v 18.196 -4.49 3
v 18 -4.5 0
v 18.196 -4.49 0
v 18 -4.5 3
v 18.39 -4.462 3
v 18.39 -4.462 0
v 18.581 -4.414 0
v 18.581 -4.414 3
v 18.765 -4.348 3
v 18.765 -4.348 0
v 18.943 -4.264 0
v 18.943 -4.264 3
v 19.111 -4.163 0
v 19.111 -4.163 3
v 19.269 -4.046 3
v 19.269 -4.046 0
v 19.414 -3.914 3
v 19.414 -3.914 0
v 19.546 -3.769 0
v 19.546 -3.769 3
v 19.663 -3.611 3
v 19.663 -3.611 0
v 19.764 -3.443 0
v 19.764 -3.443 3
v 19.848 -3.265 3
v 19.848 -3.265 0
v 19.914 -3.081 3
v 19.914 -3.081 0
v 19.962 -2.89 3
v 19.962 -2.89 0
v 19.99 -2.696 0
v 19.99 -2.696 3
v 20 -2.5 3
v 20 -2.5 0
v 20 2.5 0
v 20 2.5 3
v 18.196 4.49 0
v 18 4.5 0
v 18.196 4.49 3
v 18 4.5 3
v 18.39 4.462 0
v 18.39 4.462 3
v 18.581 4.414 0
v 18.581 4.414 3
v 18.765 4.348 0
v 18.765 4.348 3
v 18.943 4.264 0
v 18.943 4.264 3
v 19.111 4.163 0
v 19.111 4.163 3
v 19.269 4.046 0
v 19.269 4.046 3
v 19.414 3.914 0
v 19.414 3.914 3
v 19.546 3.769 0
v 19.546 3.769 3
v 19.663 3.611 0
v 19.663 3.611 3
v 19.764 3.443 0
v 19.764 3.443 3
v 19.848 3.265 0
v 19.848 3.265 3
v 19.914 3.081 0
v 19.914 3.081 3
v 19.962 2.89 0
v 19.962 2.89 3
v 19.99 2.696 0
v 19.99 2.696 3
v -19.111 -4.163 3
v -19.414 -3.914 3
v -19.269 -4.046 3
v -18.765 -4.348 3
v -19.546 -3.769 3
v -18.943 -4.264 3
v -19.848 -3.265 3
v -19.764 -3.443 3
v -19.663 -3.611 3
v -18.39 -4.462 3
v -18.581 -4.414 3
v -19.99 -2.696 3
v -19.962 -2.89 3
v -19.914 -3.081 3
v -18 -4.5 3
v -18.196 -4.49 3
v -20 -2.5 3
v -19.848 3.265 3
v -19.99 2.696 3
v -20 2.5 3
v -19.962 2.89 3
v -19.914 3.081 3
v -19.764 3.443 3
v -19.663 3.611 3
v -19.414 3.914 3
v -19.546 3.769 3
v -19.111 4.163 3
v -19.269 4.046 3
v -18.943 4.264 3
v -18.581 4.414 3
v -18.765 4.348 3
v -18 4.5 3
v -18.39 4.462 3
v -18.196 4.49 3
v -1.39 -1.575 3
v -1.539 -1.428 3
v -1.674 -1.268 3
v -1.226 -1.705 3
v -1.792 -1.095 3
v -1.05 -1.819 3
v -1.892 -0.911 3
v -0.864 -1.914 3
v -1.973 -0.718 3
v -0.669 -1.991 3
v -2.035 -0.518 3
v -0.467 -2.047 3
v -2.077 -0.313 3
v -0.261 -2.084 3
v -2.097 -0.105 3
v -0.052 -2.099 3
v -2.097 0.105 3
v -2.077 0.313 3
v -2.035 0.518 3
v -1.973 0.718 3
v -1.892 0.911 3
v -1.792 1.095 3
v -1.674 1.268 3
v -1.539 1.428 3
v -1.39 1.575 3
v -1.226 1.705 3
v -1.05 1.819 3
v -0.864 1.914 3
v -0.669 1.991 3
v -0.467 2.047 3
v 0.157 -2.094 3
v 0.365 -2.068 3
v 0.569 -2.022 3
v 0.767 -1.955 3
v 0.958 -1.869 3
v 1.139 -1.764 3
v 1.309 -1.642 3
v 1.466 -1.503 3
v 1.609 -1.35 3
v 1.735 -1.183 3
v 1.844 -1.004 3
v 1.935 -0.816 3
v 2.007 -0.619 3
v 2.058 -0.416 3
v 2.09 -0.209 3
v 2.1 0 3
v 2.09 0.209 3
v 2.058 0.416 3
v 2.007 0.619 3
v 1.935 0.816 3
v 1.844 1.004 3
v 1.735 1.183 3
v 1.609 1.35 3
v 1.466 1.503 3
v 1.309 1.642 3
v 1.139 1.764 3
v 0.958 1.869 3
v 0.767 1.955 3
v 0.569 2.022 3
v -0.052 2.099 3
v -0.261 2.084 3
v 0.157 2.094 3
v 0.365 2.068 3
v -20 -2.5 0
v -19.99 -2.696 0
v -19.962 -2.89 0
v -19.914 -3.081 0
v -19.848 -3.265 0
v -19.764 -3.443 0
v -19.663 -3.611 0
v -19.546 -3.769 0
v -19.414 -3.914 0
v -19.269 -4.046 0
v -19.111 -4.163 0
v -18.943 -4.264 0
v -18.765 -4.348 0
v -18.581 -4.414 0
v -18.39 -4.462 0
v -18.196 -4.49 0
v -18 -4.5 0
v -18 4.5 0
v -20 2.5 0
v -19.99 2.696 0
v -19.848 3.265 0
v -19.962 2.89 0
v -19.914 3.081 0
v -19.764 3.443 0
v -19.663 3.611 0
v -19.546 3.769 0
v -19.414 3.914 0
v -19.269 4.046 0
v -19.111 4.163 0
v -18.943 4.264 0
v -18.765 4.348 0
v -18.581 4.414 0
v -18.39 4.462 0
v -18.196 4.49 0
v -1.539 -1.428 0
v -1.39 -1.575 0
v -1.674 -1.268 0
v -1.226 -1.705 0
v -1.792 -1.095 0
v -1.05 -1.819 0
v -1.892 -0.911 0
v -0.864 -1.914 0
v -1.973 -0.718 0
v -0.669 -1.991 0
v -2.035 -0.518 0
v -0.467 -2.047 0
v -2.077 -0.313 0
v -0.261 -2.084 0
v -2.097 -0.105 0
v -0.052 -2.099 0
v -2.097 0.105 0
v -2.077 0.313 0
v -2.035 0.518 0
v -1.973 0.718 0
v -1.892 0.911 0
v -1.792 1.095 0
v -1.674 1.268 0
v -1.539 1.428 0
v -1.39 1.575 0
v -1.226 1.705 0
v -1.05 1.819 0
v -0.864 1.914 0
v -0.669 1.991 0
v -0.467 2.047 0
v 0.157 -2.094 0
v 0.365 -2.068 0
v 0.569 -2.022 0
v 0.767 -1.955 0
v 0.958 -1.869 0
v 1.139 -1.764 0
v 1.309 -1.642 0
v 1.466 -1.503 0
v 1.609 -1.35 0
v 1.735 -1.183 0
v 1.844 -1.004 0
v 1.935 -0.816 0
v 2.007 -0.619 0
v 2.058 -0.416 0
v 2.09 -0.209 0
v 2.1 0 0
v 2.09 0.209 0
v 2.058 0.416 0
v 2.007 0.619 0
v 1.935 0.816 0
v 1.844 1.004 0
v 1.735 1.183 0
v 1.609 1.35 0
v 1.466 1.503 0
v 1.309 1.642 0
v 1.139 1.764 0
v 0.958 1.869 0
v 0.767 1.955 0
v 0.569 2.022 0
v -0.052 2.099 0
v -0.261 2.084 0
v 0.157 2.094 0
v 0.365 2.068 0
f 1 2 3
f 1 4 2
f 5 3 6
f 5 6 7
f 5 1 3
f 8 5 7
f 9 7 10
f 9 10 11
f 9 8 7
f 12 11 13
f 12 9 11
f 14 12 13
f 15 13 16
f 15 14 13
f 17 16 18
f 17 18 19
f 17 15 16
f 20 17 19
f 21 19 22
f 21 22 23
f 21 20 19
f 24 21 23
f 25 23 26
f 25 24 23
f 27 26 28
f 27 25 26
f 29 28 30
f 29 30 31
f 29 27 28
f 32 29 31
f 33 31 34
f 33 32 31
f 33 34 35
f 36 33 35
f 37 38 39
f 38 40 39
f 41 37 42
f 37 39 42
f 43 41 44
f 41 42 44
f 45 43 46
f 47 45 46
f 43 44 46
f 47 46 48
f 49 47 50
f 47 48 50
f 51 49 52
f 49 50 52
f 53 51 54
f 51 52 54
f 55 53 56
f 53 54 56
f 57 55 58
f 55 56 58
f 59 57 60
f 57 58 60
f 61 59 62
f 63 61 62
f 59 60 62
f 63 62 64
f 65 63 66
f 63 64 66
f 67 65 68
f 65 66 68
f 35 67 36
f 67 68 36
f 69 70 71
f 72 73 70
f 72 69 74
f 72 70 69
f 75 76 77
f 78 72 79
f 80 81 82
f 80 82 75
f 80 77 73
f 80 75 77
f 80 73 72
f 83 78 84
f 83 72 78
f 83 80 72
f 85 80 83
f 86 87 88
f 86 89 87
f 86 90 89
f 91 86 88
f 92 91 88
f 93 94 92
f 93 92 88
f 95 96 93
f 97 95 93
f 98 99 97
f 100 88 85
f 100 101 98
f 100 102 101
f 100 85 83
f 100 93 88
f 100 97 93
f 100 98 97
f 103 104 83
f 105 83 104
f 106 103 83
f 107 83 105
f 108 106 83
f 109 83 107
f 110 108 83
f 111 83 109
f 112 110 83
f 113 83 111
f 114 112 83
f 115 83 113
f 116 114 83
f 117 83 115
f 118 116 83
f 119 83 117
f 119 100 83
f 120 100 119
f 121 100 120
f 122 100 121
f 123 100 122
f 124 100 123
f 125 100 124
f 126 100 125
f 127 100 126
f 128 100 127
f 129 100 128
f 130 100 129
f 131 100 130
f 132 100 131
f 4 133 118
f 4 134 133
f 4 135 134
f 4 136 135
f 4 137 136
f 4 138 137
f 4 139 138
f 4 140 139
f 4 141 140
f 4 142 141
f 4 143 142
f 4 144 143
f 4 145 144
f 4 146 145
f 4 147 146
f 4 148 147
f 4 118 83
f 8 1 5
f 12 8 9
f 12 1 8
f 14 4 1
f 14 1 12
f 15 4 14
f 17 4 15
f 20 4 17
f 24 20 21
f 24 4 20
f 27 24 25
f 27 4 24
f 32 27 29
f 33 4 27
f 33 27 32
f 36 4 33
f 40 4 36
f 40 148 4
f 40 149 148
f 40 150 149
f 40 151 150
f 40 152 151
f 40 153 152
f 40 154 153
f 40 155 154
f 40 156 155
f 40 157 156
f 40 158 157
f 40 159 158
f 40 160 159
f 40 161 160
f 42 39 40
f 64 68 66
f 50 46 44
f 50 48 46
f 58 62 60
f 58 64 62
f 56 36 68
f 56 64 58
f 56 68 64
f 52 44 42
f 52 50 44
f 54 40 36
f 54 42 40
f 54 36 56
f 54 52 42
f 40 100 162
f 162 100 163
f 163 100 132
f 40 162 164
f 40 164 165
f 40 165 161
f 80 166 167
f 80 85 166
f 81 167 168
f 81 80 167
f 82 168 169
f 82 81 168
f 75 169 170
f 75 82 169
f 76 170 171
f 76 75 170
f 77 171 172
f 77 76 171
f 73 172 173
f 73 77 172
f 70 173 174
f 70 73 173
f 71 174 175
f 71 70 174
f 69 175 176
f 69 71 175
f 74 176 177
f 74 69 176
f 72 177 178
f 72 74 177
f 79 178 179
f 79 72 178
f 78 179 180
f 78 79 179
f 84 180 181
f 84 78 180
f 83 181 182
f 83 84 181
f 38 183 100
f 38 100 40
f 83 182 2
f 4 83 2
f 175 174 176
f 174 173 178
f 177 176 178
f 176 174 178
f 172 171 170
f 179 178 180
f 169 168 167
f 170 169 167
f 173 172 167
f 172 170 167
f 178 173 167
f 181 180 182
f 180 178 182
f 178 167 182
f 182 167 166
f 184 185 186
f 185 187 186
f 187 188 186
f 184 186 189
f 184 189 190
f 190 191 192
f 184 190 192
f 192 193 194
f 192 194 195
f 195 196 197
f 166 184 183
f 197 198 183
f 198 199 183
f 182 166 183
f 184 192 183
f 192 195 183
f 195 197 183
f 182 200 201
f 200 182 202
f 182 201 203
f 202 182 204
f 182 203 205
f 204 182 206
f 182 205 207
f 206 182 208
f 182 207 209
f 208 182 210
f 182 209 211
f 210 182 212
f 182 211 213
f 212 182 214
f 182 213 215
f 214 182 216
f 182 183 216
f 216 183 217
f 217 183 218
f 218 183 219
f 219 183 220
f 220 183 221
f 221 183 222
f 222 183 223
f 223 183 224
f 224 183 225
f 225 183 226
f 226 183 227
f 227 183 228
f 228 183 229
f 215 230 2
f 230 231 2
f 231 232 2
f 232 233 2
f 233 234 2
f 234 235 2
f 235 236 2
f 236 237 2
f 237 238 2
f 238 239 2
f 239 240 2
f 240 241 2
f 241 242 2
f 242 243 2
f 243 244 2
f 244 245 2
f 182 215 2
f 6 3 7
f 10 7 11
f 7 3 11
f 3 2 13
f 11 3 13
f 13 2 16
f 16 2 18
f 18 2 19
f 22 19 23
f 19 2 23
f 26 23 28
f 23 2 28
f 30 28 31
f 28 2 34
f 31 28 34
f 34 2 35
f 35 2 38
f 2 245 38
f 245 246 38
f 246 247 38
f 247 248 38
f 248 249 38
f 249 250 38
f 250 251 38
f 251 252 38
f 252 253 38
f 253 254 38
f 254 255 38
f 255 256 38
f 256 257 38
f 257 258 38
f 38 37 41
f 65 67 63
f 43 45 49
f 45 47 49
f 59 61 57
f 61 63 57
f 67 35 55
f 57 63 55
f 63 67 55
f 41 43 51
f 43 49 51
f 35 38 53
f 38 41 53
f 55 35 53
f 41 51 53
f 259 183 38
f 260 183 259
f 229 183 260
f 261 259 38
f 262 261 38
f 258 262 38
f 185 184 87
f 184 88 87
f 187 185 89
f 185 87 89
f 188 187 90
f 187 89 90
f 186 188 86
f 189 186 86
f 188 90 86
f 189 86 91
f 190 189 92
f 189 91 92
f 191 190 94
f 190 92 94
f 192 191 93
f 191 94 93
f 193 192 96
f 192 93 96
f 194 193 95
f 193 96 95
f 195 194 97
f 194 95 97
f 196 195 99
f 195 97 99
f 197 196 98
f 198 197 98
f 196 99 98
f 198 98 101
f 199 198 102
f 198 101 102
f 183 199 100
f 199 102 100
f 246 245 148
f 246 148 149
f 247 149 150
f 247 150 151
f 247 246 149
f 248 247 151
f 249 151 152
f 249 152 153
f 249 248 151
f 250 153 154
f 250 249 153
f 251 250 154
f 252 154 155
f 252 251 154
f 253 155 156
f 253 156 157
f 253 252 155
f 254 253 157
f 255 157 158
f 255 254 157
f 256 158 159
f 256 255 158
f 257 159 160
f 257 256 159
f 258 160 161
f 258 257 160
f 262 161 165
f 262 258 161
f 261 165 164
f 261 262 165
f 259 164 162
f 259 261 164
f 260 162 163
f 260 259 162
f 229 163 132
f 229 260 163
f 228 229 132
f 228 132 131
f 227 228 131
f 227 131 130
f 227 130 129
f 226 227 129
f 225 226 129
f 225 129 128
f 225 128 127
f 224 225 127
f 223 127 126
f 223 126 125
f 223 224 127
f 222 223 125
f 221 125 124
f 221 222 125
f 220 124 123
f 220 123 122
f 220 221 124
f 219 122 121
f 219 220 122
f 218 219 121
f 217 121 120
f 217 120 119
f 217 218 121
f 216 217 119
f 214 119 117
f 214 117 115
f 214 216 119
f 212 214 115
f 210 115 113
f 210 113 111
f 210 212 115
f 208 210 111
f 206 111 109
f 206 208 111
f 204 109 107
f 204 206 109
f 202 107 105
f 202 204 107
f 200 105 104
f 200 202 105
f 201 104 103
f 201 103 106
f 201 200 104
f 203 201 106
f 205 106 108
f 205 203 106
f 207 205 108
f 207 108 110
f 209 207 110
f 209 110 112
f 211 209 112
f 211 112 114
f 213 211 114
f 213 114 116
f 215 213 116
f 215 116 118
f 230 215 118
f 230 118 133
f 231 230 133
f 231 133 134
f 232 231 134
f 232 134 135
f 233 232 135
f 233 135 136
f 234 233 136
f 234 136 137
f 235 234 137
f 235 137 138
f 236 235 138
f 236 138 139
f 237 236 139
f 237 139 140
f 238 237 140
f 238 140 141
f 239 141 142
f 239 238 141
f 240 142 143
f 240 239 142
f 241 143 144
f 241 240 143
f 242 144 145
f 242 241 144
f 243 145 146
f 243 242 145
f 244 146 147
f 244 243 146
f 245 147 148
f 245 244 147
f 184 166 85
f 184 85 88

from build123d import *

# Parameters (mm, degrees)
SKETCH_1_W      = 40
SKETCH_1_H      = 9
SKETCH_1_R      = 2.1
EXTRUDE_1_DEPTH = 3
FILLET_1_R      = 2


with BuildPart() as part:
    # 草图1 → 凸台-拉伸1 (new body)
    with BuildSketch(Plane.XY):
        Rectangle(SKETCH_1_W, SKETCH_1_H)
        Circle(SKETCH_1_R, mode=Mode.SUBTRACT)
    extrude(amount=EXTRUDE_1_DEPTH)

    # 圆角1
    fillet_1_edges = [part.edges().sort_by_distance(p)[0] for p in [
        (-20, 4.5, 1.5),
        (20, 4.5, 1.5),
        (20, -4.5, 1.5),
        (-20, -4.5, 1.5),
    ]]
    fillet(fillet_1_edges, radius=FILLET_1_R)


solid = part.part
